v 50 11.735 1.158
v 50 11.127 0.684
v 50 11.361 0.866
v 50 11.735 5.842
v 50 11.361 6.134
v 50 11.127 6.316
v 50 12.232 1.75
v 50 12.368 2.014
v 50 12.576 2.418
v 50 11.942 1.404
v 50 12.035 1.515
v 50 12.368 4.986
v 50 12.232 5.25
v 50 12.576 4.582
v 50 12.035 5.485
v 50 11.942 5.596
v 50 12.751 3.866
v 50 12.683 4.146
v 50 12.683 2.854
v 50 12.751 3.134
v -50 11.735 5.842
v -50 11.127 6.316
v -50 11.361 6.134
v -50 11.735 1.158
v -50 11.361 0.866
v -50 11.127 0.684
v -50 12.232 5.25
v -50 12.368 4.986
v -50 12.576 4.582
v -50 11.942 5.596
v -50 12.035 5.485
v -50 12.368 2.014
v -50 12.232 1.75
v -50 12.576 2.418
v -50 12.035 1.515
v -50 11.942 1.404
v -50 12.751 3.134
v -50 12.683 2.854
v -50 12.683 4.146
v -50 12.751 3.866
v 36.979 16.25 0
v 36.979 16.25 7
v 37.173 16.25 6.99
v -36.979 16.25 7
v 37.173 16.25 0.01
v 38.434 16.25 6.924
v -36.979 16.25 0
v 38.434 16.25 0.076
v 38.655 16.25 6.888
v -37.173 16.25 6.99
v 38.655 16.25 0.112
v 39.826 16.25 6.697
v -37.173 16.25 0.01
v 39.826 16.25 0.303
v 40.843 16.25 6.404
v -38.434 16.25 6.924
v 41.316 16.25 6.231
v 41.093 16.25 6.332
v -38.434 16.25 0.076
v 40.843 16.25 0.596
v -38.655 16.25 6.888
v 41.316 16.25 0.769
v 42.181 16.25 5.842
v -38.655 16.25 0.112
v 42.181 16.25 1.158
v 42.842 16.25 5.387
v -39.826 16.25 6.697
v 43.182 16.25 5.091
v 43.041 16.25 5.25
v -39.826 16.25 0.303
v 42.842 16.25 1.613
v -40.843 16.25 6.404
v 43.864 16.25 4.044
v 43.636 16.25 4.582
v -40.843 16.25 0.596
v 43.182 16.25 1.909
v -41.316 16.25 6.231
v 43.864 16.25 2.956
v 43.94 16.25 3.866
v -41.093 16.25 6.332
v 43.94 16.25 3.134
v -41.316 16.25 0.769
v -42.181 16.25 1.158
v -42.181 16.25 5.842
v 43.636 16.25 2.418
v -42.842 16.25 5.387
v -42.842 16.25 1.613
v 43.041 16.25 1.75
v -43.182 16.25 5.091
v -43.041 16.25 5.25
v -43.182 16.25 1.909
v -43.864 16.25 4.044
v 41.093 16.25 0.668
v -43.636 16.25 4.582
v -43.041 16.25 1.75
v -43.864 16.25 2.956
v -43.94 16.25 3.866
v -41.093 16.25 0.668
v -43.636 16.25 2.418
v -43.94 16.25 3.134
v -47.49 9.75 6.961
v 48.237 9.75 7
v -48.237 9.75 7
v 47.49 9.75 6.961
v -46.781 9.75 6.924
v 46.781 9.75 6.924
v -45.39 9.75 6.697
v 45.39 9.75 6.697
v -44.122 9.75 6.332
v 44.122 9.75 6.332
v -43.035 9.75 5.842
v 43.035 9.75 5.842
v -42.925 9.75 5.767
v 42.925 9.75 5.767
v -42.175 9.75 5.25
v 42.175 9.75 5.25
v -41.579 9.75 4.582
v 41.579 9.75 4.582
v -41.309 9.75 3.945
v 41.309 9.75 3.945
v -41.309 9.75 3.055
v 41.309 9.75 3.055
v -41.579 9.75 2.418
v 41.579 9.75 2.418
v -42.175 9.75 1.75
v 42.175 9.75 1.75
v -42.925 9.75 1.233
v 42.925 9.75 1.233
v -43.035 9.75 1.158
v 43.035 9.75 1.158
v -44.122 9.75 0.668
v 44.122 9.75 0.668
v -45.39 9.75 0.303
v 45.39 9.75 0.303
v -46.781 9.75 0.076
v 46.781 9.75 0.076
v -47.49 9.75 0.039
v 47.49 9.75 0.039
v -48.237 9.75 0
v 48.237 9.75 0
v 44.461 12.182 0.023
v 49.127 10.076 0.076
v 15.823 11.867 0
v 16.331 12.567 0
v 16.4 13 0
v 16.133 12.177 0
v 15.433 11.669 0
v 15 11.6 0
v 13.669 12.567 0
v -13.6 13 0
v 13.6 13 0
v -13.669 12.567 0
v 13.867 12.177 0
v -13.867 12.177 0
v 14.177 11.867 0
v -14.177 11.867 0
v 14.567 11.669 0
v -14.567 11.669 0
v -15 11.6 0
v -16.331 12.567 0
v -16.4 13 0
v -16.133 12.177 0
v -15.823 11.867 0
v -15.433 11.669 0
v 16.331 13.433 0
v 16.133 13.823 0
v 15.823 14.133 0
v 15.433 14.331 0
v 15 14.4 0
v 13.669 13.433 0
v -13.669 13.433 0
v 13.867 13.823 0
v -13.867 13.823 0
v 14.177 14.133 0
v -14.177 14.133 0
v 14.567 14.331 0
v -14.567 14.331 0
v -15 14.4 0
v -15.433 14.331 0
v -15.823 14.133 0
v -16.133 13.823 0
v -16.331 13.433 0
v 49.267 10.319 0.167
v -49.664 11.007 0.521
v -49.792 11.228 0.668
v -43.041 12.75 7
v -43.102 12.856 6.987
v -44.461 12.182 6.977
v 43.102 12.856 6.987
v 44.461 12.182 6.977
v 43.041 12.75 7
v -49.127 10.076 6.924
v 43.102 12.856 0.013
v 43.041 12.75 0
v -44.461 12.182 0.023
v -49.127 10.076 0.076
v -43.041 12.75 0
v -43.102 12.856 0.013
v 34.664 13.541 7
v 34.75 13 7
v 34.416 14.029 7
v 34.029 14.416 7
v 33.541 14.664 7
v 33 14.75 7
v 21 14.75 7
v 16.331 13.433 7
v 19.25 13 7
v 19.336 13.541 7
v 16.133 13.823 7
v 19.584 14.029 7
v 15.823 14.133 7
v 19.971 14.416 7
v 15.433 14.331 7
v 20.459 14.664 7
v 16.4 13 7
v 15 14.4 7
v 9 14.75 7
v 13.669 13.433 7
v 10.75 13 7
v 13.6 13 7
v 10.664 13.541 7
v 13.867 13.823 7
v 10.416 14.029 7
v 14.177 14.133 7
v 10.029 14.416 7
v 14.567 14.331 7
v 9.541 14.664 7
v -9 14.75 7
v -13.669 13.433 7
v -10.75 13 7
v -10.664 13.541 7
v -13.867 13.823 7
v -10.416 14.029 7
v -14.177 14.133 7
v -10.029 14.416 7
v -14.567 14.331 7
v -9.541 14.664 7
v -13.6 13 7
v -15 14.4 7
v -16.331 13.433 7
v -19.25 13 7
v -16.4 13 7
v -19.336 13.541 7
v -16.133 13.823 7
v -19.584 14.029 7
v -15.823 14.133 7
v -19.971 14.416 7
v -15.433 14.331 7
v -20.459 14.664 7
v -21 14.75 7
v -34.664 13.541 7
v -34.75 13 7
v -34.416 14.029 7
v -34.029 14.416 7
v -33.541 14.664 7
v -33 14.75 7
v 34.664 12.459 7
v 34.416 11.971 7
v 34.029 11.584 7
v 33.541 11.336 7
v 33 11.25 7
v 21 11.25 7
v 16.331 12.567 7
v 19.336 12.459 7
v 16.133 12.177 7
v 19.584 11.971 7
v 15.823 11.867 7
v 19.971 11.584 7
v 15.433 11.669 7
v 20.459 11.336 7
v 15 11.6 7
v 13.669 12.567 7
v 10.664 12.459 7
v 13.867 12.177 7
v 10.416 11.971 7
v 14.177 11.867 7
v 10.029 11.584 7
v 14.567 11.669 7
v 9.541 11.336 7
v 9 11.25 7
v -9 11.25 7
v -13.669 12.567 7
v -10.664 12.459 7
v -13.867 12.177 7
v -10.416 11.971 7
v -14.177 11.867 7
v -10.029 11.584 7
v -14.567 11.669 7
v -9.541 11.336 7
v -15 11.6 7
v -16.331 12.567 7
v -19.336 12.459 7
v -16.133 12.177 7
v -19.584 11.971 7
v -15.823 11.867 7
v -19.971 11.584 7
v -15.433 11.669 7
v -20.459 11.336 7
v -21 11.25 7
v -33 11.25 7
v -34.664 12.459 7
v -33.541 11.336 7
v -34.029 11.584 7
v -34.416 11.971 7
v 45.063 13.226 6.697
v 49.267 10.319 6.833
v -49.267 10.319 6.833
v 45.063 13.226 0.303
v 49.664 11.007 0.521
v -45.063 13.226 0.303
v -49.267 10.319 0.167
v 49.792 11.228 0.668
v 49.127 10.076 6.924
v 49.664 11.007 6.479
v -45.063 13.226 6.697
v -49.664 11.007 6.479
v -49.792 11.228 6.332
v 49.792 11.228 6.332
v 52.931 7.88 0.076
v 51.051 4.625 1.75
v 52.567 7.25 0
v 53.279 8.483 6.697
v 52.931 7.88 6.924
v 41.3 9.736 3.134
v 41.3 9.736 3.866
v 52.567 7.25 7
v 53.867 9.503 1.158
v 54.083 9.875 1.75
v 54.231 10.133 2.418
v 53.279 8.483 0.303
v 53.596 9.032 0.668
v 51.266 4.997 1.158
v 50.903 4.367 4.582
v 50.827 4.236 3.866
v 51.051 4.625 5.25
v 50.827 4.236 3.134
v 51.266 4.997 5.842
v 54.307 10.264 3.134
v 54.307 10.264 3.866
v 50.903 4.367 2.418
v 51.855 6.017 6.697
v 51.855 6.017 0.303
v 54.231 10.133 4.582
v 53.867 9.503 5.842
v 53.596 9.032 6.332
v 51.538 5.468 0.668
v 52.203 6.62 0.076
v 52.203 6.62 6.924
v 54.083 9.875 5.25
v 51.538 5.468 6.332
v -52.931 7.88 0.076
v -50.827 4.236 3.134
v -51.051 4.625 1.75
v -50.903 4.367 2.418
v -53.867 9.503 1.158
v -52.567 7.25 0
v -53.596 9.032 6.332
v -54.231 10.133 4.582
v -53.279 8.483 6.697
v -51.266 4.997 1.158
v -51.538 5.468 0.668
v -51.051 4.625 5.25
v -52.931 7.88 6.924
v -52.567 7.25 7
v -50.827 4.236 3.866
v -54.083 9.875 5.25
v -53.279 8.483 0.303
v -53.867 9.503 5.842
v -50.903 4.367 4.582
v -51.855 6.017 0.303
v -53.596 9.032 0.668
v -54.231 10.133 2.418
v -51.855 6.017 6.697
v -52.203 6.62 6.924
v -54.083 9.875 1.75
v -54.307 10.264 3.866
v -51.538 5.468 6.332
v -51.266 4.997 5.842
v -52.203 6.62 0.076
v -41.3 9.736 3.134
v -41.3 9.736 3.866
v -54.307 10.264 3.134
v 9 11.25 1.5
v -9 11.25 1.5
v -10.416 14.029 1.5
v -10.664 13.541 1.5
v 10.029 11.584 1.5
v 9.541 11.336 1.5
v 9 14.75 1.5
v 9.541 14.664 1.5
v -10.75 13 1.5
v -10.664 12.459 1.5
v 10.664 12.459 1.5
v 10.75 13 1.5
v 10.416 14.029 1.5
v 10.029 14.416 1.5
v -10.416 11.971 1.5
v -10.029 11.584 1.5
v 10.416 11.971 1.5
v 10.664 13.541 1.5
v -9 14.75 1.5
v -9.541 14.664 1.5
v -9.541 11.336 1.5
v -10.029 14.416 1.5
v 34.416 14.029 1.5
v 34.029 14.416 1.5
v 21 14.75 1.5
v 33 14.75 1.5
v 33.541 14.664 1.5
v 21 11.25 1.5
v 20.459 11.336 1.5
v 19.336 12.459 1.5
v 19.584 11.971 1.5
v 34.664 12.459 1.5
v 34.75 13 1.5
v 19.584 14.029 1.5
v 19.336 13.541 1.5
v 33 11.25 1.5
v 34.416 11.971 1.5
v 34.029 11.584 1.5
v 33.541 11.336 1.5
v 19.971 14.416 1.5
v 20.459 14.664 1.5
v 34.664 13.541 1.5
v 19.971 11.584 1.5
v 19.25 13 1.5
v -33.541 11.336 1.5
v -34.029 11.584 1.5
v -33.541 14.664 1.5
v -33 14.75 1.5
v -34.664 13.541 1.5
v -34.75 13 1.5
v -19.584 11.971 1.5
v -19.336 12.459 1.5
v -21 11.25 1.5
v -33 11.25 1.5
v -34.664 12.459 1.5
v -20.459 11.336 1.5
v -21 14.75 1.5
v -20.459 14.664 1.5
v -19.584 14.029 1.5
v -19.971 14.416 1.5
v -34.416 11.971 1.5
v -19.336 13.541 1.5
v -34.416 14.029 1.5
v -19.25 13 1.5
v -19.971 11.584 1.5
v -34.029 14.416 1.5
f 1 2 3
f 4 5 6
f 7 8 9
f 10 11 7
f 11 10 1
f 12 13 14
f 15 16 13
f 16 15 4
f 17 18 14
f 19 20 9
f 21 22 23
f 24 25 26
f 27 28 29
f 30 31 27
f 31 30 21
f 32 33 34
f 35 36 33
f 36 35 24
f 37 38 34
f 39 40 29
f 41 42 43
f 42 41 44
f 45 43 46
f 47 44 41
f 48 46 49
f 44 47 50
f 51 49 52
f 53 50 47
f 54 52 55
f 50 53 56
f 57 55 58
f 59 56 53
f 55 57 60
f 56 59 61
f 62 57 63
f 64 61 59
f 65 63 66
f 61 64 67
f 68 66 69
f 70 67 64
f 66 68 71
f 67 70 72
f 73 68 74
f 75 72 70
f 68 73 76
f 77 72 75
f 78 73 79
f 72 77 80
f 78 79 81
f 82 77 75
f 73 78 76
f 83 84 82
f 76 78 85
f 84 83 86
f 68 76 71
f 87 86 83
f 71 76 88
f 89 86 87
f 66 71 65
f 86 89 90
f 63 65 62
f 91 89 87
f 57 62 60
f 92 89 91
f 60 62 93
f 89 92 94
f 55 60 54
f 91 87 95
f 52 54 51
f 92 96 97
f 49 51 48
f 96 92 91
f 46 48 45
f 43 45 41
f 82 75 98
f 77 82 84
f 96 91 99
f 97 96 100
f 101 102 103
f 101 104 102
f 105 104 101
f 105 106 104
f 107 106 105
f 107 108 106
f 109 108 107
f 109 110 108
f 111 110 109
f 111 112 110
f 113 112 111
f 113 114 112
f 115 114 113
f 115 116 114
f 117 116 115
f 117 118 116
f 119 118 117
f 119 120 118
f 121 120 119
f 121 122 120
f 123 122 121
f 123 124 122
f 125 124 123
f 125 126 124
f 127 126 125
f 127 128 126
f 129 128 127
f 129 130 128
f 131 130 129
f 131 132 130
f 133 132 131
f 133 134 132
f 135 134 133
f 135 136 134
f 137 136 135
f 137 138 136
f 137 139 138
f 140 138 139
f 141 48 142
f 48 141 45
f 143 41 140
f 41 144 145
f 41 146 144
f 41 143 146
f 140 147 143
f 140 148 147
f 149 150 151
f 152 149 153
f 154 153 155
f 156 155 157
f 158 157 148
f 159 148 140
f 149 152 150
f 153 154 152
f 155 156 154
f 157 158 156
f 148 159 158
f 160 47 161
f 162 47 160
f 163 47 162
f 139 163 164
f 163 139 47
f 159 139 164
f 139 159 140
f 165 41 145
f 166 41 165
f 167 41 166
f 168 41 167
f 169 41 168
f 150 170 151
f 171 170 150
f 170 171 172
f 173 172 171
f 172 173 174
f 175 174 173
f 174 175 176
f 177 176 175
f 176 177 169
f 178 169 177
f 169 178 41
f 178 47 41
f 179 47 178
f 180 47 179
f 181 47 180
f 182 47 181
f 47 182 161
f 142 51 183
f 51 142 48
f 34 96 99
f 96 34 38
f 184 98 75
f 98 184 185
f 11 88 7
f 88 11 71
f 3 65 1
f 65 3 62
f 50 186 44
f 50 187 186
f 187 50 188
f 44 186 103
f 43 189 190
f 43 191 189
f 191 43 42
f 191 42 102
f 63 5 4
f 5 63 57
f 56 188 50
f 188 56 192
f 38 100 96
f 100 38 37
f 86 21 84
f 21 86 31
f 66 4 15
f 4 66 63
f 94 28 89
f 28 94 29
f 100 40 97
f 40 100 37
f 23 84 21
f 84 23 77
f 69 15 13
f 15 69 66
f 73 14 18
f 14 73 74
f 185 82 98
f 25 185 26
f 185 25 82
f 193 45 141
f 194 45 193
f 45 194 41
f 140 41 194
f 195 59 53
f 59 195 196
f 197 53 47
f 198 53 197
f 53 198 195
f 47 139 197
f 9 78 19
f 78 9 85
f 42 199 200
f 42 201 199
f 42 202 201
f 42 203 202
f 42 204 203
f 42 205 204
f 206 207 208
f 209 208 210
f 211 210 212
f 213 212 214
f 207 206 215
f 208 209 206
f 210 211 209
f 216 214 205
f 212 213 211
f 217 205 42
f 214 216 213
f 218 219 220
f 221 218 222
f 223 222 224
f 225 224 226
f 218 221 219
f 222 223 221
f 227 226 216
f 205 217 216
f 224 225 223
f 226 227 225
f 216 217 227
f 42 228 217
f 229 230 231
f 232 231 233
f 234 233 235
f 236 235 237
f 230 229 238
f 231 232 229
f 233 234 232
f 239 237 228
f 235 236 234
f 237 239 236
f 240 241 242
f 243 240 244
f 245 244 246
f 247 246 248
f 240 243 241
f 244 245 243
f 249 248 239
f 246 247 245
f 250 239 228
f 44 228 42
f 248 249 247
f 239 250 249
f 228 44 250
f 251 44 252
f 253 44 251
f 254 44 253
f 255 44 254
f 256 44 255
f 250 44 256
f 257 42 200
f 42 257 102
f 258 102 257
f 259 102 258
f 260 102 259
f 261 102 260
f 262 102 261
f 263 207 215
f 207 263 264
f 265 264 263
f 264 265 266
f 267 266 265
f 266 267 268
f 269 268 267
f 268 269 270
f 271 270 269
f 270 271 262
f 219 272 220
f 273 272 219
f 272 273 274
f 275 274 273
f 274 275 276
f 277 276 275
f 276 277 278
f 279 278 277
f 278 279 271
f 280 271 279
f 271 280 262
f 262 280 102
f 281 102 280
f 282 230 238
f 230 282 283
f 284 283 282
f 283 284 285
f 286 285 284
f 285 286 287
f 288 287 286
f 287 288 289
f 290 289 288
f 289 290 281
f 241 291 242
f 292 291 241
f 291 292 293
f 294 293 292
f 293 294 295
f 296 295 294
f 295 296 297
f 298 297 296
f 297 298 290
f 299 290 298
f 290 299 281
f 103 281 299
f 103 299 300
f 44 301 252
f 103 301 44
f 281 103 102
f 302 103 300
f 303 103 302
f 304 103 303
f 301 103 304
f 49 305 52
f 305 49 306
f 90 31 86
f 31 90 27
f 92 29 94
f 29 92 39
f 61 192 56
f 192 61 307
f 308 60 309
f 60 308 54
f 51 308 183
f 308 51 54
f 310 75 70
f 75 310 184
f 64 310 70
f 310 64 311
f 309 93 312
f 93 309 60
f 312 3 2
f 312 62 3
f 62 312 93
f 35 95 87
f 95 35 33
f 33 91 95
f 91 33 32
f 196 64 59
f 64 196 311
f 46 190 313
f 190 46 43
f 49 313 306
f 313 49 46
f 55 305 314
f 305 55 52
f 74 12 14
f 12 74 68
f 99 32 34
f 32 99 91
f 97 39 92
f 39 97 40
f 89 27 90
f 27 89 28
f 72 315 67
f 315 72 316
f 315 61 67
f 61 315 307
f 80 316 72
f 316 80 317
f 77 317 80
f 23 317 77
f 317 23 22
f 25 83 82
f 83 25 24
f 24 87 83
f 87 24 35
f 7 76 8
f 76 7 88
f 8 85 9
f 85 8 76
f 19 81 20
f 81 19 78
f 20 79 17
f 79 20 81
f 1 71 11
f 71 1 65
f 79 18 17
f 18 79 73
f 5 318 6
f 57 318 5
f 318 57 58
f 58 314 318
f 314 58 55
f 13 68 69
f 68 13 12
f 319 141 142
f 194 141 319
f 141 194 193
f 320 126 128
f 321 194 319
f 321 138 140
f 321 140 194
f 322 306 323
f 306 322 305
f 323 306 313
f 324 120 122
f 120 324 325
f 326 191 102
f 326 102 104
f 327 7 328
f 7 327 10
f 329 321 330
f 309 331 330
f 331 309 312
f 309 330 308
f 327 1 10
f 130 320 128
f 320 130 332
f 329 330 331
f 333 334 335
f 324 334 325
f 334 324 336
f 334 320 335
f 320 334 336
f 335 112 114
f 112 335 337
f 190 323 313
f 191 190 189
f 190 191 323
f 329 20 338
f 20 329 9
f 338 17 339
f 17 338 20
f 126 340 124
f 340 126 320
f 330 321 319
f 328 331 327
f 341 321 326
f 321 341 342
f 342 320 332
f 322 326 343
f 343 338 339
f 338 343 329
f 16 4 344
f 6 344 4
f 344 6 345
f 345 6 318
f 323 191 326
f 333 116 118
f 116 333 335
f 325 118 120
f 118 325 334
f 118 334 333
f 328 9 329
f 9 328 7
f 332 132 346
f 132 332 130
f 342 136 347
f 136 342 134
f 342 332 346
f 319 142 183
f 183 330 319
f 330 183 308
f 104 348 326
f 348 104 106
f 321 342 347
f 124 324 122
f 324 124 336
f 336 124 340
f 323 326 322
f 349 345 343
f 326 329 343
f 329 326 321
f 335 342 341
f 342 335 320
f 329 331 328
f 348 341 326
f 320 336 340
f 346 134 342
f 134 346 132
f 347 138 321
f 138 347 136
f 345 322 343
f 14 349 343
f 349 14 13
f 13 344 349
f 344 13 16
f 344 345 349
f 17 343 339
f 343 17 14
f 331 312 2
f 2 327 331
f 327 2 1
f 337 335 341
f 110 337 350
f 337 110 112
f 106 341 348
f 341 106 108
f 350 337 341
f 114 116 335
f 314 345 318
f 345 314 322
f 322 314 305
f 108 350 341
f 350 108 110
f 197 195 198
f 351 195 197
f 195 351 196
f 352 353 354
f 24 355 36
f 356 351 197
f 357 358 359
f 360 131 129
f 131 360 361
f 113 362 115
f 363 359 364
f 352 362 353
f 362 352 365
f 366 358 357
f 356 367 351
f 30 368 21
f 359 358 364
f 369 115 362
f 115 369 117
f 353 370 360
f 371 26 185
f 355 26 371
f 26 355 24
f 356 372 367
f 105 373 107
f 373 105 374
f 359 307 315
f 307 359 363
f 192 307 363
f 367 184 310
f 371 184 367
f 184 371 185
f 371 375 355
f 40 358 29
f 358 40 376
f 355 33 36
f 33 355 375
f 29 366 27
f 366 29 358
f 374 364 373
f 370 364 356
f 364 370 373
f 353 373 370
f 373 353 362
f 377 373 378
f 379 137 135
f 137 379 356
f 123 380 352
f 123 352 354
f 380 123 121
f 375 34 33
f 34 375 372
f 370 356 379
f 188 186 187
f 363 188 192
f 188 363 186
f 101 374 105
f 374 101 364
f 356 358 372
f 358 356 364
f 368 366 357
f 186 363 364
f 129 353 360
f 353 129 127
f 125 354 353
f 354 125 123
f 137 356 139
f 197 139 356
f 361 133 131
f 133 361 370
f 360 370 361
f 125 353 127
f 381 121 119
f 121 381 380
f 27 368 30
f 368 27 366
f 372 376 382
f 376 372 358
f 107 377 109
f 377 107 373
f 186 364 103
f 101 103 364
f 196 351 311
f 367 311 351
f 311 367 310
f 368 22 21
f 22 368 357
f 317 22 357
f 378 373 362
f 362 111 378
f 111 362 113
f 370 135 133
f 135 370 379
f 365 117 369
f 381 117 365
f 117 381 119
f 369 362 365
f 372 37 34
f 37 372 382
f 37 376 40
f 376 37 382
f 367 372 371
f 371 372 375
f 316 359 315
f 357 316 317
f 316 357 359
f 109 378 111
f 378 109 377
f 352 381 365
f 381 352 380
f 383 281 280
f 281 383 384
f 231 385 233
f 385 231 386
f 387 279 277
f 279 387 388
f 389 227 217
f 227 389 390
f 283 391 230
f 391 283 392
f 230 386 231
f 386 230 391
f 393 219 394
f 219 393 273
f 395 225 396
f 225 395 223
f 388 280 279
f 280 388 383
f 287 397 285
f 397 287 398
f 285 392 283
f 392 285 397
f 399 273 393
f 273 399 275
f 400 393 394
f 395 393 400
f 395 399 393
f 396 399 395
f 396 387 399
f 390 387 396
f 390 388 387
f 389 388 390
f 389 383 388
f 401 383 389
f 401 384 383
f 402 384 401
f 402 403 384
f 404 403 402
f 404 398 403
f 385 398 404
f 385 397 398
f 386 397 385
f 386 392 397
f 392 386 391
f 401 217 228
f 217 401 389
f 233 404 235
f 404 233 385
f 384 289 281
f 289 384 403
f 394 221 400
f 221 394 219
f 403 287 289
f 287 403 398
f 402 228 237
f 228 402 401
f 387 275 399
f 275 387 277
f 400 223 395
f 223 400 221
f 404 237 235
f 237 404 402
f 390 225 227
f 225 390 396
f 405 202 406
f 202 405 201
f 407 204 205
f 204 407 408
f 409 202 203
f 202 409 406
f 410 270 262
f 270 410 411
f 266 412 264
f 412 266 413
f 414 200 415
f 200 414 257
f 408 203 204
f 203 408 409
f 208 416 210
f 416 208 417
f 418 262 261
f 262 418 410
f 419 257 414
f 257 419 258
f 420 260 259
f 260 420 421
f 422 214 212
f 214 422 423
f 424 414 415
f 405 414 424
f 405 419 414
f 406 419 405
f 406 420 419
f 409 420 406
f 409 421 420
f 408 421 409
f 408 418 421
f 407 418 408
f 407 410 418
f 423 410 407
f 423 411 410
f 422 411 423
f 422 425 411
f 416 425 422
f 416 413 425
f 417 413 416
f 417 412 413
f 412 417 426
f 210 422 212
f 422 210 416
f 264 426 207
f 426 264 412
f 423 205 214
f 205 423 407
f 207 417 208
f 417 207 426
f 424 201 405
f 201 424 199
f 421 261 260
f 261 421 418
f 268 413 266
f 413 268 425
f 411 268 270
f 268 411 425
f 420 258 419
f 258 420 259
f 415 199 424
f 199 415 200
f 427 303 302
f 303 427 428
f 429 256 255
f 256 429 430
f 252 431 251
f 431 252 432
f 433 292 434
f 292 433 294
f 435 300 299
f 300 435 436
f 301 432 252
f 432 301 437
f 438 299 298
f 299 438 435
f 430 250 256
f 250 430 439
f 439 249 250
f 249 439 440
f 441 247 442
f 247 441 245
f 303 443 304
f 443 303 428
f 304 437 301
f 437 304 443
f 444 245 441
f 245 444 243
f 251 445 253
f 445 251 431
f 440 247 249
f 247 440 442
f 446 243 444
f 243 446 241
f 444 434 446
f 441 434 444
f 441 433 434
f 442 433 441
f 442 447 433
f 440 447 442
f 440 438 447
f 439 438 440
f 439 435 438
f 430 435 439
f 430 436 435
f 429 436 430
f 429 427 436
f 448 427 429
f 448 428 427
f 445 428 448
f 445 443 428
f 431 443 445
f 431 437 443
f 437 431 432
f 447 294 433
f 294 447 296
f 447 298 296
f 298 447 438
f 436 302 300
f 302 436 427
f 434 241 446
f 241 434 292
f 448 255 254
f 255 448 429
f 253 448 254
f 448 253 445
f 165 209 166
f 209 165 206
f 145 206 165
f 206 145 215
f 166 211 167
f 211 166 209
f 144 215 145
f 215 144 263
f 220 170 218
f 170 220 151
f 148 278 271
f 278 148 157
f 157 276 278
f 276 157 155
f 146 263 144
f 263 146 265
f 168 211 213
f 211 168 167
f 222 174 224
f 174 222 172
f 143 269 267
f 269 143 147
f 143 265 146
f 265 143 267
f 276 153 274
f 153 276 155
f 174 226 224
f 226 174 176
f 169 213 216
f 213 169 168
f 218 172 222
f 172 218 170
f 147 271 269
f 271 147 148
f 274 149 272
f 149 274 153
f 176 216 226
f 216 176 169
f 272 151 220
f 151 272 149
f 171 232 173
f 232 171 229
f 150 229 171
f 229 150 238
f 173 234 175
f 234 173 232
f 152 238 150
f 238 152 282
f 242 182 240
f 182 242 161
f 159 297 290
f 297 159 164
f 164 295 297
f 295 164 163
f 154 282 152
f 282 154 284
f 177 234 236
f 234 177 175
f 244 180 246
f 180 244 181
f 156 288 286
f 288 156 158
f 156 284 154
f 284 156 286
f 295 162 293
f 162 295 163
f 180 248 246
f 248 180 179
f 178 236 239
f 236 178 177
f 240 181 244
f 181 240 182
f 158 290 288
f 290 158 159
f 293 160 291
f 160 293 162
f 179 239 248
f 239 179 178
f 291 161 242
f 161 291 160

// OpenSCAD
//*********************************************
//   2.4GHz Antenna boom holder for Eachine 250 FPV racer
//             (W) Henning Stöcklein  04.10.2016
//                 Free for non commercial use
//*********************************************

// Rotation angle of antennas (30 for Eachine 250)
antangle = 30; // [20:60]

// Hole diameter of antenna tube (3.5 for bowden tube)
ant_d = 3.5 ;

// Antenna tube length (11 for Eachine 250)
ant_len = 11 ; // [6:0.5:20]

// Block height (7 for Eachine 250)
block_h = 7 ; // [5:10]

// Block width (6.5 for Eachine 250)
block_w = 6.5 ; // [5:0.1:10]

// Weight reduction slots (on/off)
oval_hole = 1 ; // [0:No, 1:Yes]

// Screw distance (30 for Eachine 250)
screw_dist = 30 ; // [20:40]

// Screw hole diameter (2.8 for M3 driller)
M3_d = 2.8 ; // [2:0.1:4]

// X position of antennas (53 for Eachine 250)
antpos_x = 53 ; // [40:60]

// y position of antennas (3 for Eachine 250)
antpos_y = 3 ; // [1:0.1:4]

// Show baseplate tail of Eachine 250?
show_tail = 0 ; // [0:No, 1:Yes]

// * End of customizable parameters
// ******************************************

module antholder()
{
    difference()
    {
       // Body frame 
       union()
       {
         intersection()
         {
            translate ([0,3,0]) cube ([100, block_w, 10], center=true) ;
            hull ()
            {
                 translate ([+antpos_x,-antpos_y,0]) rotate ([0,90,-antangle]) 
                        cylinder (r=block_h/2, h=50, $fn=30, center=true) ;
                 translate ([-antpos_x,-antpos_y,0]) rotate ([0,90,antangle])
                        cylinder (r=block_h/2, h=50, $fn=30, center=true) ;
            } // hull
         } // intersection

        // Antenna tube cylinders
        translate ([+antpos_x,-antpos_y,0]) rotate ([0,90,-antangle])  translate ([0,0,-6]) 
            cylinder (r=block_h/2, ant_len, $fn=30, center=true) ;
        translate ([-antpos_x,-antpos_y,0]) rotate ([0,90,+antangle])  translate ([0,0,+6]) 
            cylinder (r=block_h/2, ant_len, $fn=30, center=true) ;
       
        } // union
                   
       // Screw holes
       translate ([screw_dist/2, 3, 0]) cylinder (r=M3_d/2, h=20, $fn=20, center=true) ;
       translate ([-screw_dist/2, 3, 0]) cylinder (r=M3_d/2, h=20, $fn=20, center=true) ;

       // Weight reduction slots
       if (oval_hole == 1)
       {
         hull () {                // middle
            translate ([-screw_dist/2+6, 3, 3]) cylinder (r=block_w/2-1.5, h=10, $fn=20, center=true) ;
            translate ([+screw_dist/2-6, 3, 3]) cylinder (r=block_w/2-1.5, h=10, $fn=20, center=true) ;
         }
         hull () {
            translate ([screw_dist/2+6, 3, 3]) cylinder (r=block_w/2-1.5, h=10, $fn=20, center=true) ;
            translate ([screw_dist/2+18, 3, 3]) cylinder (r=block_w/2-1.5, h=10, $fn=20, center=true) ;
         }
         hull () {
            translate ([-screw_dist/2-6, 3, 3]) cylinder (r=block_w/2-1.5, h=10, $fn=20, center=true) ;
            translate ([-screw_dist/2-18, 3, 3]) cylinder (r=block_w/2-1.5, h=10, $fn=20, center=true) ;
         }
       }
       
       // Antenna tube holes
%    translate ([+antpos_x,-antpos_y,0]) rotate ([0,90,-antangle]) cylinder (r=ant_d/2, h=70, $fn=30, center=true) ;
%    translate ([-antpos_x,-antpos_y,0]) rotate ([0,90,antangle]) cylinder (r=ant_d/2, h=70, $fn=30, center=true) ;
    }
}

module eachtail()
{
    color ("Dimgrey") translate ([0,90, -1.7/2])
    difference()
    {
       cube ([70, 180, 1.8], center=true) ;
       translate ([70/2,-90-20,-5]) rotate([0,0,45]) cube ([20,20,10]);
       translate ([-70/2,-90-20,-5]) rotate([0,0,45]) cube ([20,20,10]);
    }

    // MPX plug
    difference () {
      color ("Green") translate ([27, 26, 11/2]) cube ([7, 16, 11], center=true) ;
      translate ([27, 26, 5+11/2]) cube ([5, 14, 10], center=true) ;
      translate ([24, 26, 5+11/2]) cube ([8, 9, 10], center=true) ;
    }
    
    // LED bar
    color ("Dimgrey") translate ([0, 6, 11/2]) cube ([81, 4, 13], center=true) ;
    color ("White") 
       for (px = [-37.5:10:37])                   // 8 Neopixel LEDs
           translate ([px, 3.5, 4]) cube ([5,2,5])  ;
    
}

if (show_tail == 1) eachtail() ;

translate ([0,10,block_h/2]) antholder() ;
